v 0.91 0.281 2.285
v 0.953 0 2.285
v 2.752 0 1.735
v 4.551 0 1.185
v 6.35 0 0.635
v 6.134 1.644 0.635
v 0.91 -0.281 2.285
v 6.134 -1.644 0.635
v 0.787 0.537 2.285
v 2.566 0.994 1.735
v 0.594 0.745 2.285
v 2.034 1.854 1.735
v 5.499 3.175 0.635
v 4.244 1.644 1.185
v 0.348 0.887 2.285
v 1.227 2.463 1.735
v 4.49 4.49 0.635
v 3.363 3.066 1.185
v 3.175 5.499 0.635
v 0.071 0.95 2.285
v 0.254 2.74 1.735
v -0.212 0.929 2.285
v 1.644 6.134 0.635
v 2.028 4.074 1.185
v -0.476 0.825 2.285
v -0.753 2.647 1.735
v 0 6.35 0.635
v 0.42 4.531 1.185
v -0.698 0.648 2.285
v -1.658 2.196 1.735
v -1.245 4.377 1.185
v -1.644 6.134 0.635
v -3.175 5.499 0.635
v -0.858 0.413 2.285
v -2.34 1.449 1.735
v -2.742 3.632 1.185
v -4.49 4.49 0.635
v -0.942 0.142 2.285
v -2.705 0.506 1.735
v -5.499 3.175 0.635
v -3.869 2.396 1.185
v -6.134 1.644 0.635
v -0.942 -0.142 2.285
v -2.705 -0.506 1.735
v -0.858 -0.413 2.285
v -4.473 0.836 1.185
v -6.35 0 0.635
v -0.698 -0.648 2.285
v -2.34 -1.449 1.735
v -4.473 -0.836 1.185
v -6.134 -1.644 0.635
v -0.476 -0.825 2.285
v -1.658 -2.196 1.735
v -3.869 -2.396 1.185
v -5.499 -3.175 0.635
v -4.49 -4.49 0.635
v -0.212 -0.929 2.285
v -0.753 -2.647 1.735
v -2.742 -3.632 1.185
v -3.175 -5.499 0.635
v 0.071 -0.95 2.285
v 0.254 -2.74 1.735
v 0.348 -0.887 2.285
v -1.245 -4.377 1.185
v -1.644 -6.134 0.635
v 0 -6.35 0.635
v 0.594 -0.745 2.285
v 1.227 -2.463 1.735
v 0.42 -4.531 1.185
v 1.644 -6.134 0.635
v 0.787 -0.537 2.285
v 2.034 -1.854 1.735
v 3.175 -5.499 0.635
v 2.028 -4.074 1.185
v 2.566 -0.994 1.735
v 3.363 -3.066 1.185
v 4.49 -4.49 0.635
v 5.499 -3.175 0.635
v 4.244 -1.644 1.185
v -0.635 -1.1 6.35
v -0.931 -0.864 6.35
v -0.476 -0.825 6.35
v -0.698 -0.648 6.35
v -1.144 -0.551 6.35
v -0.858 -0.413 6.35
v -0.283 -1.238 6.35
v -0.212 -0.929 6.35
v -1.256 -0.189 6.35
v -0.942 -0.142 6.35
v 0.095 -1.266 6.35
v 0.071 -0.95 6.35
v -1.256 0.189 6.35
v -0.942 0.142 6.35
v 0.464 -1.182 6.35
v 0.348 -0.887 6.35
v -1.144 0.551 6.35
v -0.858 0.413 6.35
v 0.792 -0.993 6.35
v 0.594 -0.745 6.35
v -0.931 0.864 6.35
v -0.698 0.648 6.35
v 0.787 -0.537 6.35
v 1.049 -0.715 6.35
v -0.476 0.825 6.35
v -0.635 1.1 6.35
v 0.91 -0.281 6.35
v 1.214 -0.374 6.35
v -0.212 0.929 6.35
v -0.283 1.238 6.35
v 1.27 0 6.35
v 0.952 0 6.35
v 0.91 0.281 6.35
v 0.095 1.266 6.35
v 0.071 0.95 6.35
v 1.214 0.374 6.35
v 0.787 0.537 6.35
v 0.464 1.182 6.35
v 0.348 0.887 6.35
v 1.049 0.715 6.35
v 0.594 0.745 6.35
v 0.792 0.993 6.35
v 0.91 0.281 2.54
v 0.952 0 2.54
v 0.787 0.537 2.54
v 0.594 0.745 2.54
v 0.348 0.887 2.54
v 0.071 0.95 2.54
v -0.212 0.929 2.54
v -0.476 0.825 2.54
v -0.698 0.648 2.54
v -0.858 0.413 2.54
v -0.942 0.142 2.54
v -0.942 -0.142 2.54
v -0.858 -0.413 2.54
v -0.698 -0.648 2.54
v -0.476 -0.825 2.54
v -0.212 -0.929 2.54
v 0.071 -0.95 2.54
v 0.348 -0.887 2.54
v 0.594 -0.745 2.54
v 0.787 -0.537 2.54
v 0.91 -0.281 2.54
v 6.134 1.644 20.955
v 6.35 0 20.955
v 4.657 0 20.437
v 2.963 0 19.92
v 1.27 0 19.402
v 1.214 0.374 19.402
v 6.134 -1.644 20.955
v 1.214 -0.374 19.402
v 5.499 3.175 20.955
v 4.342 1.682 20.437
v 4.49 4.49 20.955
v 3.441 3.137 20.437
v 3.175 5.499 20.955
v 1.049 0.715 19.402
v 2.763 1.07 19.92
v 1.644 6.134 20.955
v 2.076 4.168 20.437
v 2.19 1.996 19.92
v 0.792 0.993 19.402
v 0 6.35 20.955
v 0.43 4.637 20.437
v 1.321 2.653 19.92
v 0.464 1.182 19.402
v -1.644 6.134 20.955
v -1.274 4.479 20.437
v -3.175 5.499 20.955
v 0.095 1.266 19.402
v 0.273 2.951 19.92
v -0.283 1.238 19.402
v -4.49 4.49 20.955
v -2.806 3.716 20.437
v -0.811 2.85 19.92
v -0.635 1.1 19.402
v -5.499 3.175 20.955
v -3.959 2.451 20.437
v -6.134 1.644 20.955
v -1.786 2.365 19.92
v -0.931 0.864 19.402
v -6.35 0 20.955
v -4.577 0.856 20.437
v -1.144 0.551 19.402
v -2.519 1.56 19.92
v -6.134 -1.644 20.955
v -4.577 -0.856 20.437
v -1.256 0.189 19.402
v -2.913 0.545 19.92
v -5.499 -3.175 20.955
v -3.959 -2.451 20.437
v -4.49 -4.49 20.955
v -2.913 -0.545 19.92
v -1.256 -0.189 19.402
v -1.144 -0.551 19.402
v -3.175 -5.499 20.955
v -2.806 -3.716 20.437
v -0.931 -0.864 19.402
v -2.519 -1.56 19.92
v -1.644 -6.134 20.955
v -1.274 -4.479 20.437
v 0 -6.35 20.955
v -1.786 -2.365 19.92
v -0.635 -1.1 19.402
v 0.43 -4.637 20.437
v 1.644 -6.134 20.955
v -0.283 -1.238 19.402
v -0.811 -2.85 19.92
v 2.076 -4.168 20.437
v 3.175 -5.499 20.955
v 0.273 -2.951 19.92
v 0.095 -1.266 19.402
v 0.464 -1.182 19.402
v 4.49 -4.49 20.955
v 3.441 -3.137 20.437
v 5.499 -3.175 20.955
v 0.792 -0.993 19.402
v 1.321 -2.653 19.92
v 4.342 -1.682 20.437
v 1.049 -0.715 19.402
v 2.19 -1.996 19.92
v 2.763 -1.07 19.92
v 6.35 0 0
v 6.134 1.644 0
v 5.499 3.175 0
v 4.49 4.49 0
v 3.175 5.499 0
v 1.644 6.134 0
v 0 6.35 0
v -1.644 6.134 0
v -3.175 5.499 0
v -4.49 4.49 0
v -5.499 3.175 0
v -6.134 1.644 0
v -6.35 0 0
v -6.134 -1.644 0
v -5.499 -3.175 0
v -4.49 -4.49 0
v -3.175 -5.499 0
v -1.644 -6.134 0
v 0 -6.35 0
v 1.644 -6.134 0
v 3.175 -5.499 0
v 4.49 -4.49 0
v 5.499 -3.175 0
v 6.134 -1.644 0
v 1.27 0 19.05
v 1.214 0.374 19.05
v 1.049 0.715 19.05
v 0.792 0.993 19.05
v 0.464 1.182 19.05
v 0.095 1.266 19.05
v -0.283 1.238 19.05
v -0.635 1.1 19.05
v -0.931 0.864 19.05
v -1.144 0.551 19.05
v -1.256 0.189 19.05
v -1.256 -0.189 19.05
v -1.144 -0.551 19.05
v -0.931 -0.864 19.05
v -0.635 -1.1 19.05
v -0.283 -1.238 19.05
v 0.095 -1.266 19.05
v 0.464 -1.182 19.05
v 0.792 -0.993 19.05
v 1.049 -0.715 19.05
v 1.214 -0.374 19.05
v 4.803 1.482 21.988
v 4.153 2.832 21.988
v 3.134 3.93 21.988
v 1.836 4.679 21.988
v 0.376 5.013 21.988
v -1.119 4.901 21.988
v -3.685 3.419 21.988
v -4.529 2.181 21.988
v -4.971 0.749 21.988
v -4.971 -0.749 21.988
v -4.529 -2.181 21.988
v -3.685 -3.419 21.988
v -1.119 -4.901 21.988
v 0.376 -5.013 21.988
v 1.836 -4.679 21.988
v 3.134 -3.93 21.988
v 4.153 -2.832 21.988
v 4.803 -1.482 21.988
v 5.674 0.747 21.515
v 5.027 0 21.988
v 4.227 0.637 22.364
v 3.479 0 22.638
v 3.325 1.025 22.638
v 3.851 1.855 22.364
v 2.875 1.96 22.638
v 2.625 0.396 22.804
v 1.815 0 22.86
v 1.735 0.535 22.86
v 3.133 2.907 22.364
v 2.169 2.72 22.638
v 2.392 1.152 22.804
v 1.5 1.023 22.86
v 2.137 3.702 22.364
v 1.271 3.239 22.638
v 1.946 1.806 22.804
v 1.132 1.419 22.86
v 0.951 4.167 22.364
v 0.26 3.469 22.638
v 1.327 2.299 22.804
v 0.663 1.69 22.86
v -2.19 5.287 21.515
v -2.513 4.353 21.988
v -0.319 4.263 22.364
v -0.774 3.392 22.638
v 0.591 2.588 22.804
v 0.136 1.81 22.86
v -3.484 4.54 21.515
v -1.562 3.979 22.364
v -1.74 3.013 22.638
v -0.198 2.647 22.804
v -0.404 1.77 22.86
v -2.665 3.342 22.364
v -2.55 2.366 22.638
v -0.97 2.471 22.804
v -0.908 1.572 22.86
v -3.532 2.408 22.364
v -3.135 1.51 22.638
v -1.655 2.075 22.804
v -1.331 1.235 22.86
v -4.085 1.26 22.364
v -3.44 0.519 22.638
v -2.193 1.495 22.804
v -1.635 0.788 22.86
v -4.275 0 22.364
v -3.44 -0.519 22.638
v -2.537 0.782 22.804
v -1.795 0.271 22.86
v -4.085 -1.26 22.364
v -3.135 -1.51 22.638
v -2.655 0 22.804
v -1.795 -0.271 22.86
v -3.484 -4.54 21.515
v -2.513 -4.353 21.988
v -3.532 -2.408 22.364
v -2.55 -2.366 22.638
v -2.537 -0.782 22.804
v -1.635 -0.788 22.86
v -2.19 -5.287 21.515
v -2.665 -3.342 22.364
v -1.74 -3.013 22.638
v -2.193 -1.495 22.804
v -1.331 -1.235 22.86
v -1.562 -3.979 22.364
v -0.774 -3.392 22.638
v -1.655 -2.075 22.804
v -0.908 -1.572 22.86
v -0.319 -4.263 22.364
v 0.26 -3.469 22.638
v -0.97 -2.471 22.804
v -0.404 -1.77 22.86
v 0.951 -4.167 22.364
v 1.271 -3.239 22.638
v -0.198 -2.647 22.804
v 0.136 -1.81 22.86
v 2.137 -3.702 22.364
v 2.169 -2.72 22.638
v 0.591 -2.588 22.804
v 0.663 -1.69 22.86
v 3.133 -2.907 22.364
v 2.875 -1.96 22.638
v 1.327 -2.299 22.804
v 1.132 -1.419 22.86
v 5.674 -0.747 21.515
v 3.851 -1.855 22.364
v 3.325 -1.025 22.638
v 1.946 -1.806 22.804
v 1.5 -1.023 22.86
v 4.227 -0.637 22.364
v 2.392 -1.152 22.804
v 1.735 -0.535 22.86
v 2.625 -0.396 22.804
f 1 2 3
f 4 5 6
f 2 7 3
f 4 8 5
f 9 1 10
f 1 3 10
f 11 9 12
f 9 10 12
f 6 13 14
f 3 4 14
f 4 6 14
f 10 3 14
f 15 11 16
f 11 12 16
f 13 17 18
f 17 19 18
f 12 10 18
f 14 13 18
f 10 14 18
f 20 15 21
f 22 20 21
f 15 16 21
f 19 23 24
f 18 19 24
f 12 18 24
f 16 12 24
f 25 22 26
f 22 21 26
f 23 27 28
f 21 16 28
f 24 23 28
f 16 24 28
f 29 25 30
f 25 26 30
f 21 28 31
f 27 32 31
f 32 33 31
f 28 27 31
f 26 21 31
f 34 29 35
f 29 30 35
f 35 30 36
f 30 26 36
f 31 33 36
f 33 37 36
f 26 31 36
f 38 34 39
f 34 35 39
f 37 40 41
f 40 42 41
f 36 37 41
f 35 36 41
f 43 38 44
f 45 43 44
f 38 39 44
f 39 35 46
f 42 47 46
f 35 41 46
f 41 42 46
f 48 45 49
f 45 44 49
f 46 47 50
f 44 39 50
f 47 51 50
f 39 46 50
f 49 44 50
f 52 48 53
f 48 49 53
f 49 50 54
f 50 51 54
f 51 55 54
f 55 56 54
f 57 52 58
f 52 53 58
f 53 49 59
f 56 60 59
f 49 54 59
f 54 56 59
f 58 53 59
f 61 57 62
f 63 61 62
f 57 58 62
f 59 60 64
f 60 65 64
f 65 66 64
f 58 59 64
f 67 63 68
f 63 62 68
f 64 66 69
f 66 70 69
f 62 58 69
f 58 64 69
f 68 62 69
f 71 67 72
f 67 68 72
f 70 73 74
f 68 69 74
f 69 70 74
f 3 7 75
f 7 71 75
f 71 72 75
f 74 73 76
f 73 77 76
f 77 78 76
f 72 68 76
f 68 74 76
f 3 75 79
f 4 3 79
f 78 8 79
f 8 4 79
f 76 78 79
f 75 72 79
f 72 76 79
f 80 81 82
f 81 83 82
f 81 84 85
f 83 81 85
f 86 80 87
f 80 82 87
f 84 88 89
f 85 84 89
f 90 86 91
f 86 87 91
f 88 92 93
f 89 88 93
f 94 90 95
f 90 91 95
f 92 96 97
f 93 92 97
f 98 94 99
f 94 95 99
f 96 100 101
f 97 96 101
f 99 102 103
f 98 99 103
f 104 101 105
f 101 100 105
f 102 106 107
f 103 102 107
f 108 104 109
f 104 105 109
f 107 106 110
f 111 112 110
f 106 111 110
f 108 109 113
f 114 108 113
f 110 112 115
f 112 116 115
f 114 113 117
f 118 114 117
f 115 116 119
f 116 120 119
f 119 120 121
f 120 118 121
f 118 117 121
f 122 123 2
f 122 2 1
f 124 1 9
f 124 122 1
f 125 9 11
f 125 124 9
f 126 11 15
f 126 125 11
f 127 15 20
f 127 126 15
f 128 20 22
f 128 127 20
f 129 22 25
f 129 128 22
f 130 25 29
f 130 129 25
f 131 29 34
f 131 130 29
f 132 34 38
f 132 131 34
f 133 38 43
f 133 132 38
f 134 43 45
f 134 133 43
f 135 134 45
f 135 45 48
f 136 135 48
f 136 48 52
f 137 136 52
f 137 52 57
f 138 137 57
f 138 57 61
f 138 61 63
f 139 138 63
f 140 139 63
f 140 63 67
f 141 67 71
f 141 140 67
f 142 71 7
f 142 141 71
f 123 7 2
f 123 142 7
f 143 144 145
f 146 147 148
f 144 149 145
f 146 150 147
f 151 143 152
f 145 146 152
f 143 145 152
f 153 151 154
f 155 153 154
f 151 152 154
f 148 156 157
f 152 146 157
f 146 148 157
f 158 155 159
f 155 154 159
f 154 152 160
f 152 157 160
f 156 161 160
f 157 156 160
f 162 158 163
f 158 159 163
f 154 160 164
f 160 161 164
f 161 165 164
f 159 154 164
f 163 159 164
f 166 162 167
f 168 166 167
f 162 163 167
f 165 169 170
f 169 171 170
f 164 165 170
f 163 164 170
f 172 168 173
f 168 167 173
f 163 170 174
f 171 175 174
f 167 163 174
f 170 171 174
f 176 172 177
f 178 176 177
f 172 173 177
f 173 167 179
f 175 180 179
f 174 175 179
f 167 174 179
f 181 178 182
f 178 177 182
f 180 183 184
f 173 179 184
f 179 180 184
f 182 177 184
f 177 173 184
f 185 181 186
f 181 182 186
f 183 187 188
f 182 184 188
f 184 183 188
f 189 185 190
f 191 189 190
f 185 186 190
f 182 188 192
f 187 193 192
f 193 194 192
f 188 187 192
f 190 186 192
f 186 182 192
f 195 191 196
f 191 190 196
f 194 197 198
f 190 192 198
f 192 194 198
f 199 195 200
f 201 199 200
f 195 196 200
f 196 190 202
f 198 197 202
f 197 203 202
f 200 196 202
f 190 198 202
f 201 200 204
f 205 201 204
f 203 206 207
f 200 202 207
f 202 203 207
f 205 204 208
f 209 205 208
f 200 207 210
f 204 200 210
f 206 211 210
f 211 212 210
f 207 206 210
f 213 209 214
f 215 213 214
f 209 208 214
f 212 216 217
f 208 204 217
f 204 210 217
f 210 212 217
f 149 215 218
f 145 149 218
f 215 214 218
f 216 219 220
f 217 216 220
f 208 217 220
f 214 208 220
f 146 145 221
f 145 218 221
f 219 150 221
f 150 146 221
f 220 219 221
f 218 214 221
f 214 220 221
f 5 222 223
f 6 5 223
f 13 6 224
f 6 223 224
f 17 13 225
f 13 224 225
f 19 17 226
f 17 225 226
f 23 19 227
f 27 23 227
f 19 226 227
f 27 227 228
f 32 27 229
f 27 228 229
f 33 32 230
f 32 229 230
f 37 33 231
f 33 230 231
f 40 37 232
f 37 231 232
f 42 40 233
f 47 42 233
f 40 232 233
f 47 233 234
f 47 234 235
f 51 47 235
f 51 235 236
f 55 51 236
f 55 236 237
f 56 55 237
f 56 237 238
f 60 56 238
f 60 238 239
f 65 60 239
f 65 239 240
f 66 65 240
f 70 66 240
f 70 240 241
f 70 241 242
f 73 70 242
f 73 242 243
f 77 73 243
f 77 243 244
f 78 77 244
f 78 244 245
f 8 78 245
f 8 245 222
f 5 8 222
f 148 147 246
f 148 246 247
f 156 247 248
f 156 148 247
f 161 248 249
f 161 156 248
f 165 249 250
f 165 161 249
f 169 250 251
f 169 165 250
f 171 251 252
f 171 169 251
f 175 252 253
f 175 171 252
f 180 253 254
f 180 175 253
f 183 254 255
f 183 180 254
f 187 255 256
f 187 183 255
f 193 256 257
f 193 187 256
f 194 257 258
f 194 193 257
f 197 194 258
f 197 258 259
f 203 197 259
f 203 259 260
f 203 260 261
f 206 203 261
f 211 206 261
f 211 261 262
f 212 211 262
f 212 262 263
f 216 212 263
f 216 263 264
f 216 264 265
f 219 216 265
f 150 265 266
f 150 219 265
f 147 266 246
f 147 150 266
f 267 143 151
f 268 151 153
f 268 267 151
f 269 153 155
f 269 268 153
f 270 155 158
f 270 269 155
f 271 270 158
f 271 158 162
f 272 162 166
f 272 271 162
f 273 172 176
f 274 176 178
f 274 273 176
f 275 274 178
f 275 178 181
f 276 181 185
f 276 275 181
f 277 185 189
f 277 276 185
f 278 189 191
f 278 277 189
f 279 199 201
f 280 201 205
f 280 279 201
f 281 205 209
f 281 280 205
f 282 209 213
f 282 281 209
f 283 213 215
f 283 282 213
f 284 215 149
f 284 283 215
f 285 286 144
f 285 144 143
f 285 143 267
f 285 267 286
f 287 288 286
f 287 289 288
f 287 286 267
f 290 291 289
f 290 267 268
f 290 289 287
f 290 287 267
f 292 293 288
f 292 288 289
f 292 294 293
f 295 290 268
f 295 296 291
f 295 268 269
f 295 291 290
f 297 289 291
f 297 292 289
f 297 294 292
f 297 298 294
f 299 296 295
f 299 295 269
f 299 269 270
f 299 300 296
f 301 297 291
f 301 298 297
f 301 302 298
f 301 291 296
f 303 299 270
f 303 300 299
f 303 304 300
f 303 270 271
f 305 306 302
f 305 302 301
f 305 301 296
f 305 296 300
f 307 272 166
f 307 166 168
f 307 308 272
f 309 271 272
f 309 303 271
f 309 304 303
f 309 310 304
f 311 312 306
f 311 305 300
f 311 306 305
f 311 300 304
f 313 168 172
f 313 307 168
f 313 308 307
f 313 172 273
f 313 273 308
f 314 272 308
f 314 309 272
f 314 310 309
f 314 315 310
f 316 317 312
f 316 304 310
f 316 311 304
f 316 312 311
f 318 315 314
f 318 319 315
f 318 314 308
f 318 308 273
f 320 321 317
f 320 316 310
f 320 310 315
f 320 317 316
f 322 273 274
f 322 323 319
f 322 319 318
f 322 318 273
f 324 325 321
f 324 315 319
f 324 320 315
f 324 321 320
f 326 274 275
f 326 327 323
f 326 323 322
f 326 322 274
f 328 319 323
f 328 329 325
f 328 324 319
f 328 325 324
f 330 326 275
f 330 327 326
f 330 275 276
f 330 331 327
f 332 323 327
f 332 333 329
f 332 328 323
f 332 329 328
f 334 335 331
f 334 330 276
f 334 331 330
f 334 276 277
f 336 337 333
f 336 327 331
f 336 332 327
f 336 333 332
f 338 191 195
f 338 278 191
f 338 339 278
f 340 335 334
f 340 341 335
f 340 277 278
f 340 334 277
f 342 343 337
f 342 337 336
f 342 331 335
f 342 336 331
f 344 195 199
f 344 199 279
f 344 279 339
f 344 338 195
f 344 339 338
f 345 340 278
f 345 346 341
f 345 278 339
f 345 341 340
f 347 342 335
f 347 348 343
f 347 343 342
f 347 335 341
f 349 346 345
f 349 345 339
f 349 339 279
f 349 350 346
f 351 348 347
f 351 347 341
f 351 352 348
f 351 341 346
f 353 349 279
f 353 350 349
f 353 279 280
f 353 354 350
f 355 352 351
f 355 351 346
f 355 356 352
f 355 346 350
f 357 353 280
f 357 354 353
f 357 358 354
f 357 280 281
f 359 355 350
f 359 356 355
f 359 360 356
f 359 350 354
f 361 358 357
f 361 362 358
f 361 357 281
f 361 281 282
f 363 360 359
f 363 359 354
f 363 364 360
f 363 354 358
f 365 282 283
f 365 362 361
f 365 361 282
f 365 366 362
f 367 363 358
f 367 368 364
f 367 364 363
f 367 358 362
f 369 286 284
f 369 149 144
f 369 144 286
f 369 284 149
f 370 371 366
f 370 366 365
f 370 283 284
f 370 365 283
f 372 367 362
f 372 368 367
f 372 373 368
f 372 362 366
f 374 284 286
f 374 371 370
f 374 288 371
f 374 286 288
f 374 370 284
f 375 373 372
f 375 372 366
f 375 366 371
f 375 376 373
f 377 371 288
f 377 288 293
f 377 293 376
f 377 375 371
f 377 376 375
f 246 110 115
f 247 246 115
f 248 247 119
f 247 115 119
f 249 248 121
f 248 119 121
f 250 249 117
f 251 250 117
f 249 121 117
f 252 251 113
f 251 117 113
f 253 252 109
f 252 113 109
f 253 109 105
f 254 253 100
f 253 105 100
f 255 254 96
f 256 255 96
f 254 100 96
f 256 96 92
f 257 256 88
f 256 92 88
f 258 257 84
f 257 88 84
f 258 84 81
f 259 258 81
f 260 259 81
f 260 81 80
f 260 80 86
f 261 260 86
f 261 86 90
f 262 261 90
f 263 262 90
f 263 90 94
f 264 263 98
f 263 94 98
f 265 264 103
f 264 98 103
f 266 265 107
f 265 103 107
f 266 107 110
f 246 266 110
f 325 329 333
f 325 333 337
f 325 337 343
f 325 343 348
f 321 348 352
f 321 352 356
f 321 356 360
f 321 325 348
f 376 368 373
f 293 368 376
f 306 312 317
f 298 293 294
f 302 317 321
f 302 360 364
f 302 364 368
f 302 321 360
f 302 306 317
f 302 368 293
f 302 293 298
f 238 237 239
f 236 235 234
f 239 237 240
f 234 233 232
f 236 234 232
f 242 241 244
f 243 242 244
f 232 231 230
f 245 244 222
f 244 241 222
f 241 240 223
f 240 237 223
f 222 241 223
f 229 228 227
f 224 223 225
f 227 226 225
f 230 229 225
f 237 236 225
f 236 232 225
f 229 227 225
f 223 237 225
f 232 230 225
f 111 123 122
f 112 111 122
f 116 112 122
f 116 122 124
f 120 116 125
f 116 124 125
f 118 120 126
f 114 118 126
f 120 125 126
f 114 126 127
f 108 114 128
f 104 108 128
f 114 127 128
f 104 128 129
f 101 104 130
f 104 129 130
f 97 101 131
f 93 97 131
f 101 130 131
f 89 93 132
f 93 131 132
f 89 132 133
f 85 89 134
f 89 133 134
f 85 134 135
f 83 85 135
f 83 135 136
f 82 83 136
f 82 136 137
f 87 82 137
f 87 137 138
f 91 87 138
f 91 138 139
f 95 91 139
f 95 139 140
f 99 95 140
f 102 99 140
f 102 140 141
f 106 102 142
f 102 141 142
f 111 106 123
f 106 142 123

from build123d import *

# Parameters (mm, degrees)
F0_R        = 6.35
F1_DEPTH    = 2.54
F2_R        = 0.9525
F3_DEPTH    = 3.81
F4_R        = 1.27
F5_DEPTH    = 12.7
F6_R        = 6.35
F7_DEPTH    = 3.81
F8_S5_R     = 0.9525
F8_T6_DEPTH = 11
F9_S5_R     = 1.27
F9_T6_DEPTH = 11


# Not quite as in the source:
# - a fillet or chamfer that OpenCascade refuses, or shapes differently, is made with other operations: its cross-section is extruded or revolved along the edge and cut away or added


with BuildPart() as f1:
    # F0 (on Top) → F1 (new body)
    with BuildSketch(Plane.XY):
        Circle(F0_R)
    extrude(amount=F1_DEPTH)

    # F2 (on face) → F3 (join)
    with BuildSketch(Plane.XY.offset(2.54)):
        Circle(F2_R)
    extrude(amount=F3_DEPTH)

    # F4 (on face) → F5 (join)
    with BuildSketch(Plane.XY.offset(6.35)):
        Circle(F4_R)
    extrude(amount=F5_DEPTH)

    # F6 (on face) → F7 (join)
    with BuildSketch(Plane.XY.offset(19.05)):
        Circle(F6_R)
    extrude(amount=F7_DEPTH)

    # F8: chamfer of 1.905 x 6.2309742382 on 1 edges, made by hand


with BuildPart() as f8_tool2:
    # F8_s3 → F8_t4 (revolve)
    with BuildSketch(Plane.XZ):
        Polygon((0.1190257618, 2.54), (6.35, 0.635), (6.35, 2.54), align=None)
    revolve(axis=Axis((0, 0, 2.54), (0, 0, 1)))

    # F8_s5 → F8_t6 (cut, symmetric)
    with BuildSketch(Plane.XY.offset(1.6)):
        Circle(F8_S5_R)
    extrude(amount=F8_T6_DEPTH, both=True, mode=Mode.SUBTRACT)


with BuildPart() as f1_1:
    add(f1.part)

    # F8_t1: cut F8_tool2
    add(f8_tool2.part, mode=Mode.SUBTRACT)

    # F9: chamfer of 1.905 x 6.2309742382 on 1 edges, made by hand


with BuildPart() as f9_tool2:
    # F9_s3 → F9_t4 (revolve)
    with BuildSketch(Plane.XZ):
        Polygon((6.35, 20.955), (0.1190257618, 19.05), (6.35, 19.05), align=None)
    revolve(axis=Axis((0, 0, 19.05), (0, 0, 1)))

    # F9_s5 → F9_t6 (cut, symmetric)
    with BuildSketch(Plane.XY.offset(20)):
        Circle(F9_S5_R)
    extrude(amount=F9_T6_DEPTH, both=True, mode=Mode.SUBTRACT)


with BuildPart() as f1_2:
    add(f1_1.part)

    # F9_t1: cut F9_tool2
    add(f9_tool2.part, mode=Mode.SUBTRACT)

    # F10: fillet of radius 6.35 on 1 edges, made by hand

    # F10_s1 → F10_t2 (revolve, cut)
    with BuildSketch(Plane.XZ):
        with BuildLine():
            ThreePointArc((6.35, 20.955), (4.2745373727, 22.3644107304), (1.8151929479, 22.86))
            Line((1.8151929479, 22.86), (6.35, 22.86))
            Line((6.35, 22.86), (6.35, 20.955))
        make_face()
    revolve(axis=Axis((0, 0, 22.86), (0, 0, 1)), mode=Mode.SUBTRACT)


solid = f1_2.part
